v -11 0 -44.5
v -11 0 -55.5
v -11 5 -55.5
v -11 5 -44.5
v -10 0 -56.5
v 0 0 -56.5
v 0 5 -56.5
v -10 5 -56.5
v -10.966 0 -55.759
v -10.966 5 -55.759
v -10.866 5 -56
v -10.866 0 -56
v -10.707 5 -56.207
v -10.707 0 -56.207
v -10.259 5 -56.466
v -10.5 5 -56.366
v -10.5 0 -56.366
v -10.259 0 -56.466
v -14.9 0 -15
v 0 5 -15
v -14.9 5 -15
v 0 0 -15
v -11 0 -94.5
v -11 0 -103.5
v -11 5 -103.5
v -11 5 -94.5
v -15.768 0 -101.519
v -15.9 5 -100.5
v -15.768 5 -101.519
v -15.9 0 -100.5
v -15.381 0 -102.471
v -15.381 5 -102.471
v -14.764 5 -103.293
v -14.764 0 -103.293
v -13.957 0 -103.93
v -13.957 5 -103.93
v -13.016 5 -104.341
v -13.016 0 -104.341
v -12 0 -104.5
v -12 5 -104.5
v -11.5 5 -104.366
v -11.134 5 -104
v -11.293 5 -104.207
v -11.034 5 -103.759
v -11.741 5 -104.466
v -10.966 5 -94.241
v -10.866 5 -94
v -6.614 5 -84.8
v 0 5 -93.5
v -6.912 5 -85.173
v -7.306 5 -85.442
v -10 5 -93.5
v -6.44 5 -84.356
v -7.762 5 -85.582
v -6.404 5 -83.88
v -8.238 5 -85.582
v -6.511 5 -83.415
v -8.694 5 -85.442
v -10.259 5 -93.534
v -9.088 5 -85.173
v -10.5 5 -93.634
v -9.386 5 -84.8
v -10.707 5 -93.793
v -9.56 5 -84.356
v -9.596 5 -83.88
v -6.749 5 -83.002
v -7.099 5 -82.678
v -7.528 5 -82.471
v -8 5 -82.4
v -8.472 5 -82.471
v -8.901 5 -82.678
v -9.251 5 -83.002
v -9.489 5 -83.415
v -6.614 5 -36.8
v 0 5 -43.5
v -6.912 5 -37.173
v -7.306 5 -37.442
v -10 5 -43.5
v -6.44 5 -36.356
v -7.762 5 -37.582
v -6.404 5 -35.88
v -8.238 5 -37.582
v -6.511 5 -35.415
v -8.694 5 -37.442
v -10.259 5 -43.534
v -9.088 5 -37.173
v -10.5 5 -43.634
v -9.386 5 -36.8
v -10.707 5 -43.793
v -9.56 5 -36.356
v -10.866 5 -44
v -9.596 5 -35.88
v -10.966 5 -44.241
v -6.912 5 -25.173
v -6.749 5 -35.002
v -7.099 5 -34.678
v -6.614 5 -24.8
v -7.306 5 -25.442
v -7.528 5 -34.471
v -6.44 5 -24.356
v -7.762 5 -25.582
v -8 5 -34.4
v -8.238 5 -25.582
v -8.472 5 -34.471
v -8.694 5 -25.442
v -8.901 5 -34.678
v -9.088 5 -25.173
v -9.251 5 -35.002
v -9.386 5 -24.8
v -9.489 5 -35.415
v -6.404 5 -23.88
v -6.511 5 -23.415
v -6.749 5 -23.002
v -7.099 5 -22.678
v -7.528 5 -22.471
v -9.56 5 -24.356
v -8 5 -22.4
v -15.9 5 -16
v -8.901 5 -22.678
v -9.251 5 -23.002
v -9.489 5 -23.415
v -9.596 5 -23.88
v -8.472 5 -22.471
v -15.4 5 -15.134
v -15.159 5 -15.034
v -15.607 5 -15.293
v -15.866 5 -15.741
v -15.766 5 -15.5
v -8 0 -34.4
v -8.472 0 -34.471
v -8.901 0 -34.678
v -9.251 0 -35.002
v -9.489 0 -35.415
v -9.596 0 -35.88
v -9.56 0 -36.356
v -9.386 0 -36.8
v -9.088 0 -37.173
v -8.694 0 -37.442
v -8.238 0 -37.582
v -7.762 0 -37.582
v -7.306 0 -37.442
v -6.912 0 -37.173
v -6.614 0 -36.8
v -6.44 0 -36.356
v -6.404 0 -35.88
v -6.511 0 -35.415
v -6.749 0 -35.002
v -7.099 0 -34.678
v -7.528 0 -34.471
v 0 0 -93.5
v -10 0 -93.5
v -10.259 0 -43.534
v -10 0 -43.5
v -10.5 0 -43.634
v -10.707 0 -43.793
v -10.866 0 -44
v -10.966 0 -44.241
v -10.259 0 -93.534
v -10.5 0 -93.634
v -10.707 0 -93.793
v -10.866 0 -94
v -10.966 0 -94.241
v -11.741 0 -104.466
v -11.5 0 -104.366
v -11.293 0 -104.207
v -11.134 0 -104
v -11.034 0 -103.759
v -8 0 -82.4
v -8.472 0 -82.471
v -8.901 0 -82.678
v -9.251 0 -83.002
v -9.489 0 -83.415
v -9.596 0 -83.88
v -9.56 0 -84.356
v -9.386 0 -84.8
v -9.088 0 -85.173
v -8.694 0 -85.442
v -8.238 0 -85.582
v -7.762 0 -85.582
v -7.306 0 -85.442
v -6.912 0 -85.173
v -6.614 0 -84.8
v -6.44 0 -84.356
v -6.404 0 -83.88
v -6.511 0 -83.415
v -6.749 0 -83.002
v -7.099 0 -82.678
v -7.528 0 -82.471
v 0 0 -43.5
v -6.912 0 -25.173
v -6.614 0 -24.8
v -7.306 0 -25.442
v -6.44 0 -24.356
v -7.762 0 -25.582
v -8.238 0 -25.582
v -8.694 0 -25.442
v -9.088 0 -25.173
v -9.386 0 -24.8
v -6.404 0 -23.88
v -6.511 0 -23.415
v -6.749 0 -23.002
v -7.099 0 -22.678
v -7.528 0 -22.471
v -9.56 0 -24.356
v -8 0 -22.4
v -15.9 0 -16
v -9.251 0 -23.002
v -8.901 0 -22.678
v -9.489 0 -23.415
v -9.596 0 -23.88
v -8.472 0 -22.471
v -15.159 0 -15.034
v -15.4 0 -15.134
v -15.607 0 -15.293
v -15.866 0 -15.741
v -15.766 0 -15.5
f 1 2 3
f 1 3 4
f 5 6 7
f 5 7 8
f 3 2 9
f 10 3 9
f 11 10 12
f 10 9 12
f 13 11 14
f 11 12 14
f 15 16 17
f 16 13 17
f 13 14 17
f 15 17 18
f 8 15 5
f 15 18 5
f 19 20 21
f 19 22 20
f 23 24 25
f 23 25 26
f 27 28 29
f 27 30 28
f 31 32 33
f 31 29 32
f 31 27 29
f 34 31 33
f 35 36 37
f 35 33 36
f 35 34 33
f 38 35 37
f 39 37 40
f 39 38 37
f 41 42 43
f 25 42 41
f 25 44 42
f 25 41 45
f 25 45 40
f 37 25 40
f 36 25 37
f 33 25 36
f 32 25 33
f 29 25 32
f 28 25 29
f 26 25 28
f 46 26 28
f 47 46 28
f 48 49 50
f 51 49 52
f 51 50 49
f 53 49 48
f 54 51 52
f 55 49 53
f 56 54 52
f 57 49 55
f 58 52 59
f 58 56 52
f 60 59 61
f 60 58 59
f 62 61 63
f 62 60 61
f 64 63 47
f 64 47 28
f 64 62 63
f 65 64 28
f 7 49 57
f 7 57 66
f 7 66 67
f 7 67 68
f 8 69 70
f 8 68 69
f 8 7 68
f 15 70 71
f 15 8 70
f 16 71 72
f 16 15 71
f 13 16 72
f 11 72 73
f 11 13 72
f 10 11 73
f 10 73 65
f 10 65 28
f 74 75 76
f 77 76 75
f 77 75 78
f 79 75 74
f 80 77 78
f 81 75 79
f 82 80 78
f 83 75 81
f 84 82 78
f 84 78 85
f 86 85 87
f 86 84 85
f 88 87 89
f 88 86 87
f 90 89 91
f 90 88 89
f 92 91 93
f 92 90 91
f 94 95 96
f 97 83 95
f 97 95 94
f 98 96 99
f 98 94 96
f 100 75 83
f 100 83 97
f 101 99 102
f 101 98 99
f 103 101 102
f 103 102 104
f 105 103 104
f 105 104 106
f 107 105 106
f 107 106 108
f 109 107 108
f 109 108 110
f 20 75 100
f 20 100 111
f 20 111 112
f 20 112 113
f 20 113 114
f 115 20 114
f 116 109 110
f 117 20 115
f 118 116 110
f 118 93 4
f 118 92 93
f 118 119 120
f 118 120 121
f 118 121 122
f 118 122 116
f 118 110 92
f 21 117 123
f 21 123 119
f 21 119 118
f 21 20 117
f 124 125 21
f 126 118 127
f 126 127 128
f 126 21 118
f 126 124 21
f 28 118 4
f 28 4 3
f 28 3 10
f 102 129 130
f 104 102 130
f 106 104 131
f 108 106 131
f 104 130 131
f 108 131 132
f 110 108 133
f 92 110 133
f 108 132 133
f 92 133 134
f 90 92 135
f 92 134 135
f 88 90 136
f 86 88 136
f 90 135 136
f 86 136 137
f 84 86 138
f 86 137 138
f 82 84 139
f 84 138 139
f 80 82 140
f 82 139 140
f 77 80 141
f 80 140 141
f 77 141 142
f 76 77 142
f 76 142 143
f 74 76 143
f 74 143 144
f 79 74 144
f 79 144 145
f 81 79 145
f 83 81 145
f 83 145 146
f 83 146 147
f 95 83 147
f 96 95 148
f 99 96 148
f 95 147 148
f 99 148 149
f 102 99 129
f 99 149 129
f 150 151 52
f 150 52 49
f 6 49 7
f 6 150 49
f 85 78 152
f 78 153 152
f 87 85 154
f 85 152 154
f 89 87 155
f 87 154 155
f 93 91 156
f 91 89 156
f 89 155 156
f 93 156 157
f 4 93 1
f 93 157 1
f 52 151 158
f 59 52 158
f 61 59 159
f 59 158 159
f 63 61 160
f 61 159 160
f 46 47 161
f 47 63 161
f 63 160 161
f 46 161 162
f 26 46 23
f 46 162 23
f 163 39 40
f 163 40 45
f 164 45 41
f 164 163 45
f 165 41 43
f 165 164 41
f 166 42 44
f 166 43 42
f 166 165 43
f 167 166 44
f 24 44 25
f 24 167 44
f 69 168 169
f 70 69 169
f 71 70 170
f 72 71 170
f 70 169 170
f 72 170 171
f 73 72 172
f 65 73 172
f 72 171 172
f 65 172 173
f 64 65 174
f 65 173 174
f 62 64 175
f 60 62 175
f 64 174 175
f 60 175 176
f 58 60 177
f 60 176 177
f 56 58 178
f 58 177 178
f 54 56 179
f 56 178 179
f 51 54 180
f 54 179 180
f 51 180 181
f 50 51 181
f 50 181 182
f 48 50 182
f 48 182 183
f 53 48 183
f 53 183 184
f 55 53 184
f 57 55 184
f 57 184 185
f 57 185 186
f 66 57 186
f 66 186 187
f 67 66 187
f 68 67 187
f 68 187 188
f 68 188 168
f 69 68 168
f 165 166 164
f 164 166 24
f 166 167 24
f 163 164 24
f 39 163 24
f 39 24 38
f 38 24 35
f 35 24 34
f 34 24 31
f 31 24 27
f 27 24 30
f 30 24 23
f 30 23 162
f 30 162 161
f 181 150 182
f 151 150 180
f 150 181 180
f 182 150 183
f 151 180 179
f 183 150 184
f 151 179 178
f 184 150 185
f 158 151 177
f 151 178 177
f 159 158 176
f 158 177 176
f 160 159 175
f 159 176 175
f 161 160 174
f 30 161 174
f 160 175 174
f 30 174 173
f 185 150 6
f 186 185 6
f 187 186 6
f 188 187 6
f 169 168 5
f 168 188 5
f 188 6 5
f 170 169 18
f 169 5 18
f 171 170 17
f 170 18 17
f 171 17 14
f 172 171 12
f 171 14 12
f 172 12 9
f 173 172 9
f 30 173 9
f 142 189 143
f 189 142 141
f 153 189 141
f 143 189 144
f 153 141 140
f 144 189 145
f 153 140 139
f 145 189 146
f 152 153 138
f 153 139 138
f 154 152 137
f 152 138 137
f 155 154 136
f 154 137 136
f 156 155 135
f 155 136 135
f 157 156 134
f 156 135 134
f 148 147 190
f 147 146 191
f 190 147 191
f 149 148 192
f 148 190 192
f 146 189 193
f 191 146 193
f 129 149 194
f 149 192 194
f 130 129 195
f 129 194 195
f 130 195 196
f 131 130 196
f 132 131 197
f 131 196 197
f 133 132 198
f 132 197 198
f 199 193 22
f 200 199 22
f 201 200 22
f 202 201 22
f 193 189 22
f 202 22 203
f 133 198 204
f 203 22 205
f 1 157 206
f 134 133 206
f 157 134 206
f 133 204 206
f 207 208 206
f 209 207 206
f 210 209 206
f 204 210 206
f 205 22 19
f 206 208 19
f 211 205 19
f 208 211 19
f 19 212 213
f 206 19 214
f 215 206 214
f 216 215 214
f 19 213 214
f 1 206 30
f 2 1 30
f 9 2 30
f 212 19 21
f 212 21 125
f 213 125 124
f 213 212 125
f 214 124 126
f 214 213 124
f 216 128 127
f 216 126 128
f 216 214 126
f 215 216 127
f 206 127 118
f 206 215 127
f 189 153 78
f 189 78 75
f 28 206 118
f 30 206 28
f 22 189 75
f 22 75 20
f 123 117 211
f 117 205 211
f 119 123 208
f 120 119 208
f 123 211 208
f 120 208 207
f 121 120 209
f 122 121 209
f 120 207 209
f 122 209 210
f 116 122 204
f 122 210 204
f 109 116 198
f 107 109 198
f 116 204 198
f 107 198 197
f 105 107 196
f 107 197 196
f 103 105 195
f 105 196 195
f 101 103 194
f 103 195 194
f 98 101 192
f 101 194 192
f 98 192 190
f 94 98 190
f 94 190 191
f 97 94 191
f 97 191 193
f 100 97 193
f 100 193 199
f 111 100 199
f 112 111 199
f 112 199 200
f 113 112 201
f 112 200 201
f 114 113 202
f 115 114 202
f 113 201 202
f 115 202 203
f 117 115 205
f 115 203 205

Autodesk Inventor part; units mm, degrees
ref_plane "YZ Plane" through (0, 0, 0) normal (1, 0, 0) x (0, 1, 0)
ref_plane "XZ Plane" through (0, 0, 0) normal (0, 1, 0) x (-1, 0, 0)
ref_plane "XY Plane" through (0, 0, 0) normal (0, 0, 1) x (1, 0, 0)
sketch "Sketch1" plane through (0, 0, 0) normal (0, 1, 0) x (-1, 0, 0)
  line L0 (0, 0) -> (15.9, 0)
  line L1 (15.9, -16) -> (15.9, -100.5)
  line L2 (10, -104.5) -> (0, -104.5)
  line L3 (0, -104.5) -> (0, 0)
  line L4 (0, -104.5) -> (11, -104.5)
  line L5 (11, -103.5) -> (11, -94.5)
  line L6 (10, -93.5) -> (0, -93.5)
  line L7 (0, -93.5) -> (0, -104.5)
  line L8 (10, -43.5) -> (0, -43.5)
  line L9 (0, -43.5) -> (0, -56.5)
  line L10 (0, -56.5) -> (10, -56.5)
  line L11 (11, -55.5) -> (11, -44.5)
  line L12 (15.9, 0) -> (0, 0)
  line L13 (0, 0) -> (0, -15)
  line L14 (0, -15) -> (14.9, -15)
  line L15 (15.9, -15) -> (15.9, 0)
  arc A0 (11.9, -104.5) -> (15.9, -100.5) centre (11.9, -100.5) ccw
  arc A1 (15.9, -16) -> (14.9, -15) centre (14.9, -16) ccw
  arc A2 (11, -44.5) -> (10, -43.5) centre (10, -44.5) ccw
  arc A3 (10, -56.5) -> (11, -55.5) centre (10, -55.5) ccw
  arc A4 (11, -94.5) -> (10, -93.5) centre (10, -94.5) ccw
  line L16 (11.9, -104.5) -> (12, -104.5)
  arc A5 (11, -103.5) -> (12, -104.5) centre (12, -103.5) ccw
  point P0 (15.9, -104.5)
  point P1 (11, -93.5)
  point P2 (11, -43.5)
  point P3 (11, -56.5)
  point P4 (0, -43.5)
  point P5 (0, -56.5)
  point P6 (11.9667, -104.4994)
  dimension "d0" = 15.9
  dimension "d1" = 104.5
  dimension "d2" = 11
  dimension "d3" = 11
  dimension "d4" = 11
  dimension "d5" = 13
  dimension "d6" = 56.5
  dimension "d7" = 15
  dimension "d8" = 4
  dimension "d9" = 1
  dimension "d22" = 1
extrude "Extrusion1" add sketch "Sketch1" along normal blind 5 contours L1 A0 A5 L5 A4 L6 L3 L10 A3 L11 A2 L8 L14 A1
sketch "Sketch2" plane through (0, 5, 0) normal (0, 1, 0) x (1, 0, 0)
  line L0 (-8, -6.918) -> (-8, 116.4057) construction
  line L1 (0, 15) -> (0, 43.5) construction
  point P0 (0, 0)
  point P1 (-8, 84)
  point P2 (-8, 36)
  point P3 (-8, 24)
  dimension "d12" = 8
  dimension "d13" = 36
  dimension "d14" = 84
  dimension "d23" = 24
hole "Hole1" at (-8, 5, -84) at (-8, 5, -36) at (-8, 5, -24) direction (0, -1, 0) diameter 3.2 end through all
properties part number "Lower slide"
